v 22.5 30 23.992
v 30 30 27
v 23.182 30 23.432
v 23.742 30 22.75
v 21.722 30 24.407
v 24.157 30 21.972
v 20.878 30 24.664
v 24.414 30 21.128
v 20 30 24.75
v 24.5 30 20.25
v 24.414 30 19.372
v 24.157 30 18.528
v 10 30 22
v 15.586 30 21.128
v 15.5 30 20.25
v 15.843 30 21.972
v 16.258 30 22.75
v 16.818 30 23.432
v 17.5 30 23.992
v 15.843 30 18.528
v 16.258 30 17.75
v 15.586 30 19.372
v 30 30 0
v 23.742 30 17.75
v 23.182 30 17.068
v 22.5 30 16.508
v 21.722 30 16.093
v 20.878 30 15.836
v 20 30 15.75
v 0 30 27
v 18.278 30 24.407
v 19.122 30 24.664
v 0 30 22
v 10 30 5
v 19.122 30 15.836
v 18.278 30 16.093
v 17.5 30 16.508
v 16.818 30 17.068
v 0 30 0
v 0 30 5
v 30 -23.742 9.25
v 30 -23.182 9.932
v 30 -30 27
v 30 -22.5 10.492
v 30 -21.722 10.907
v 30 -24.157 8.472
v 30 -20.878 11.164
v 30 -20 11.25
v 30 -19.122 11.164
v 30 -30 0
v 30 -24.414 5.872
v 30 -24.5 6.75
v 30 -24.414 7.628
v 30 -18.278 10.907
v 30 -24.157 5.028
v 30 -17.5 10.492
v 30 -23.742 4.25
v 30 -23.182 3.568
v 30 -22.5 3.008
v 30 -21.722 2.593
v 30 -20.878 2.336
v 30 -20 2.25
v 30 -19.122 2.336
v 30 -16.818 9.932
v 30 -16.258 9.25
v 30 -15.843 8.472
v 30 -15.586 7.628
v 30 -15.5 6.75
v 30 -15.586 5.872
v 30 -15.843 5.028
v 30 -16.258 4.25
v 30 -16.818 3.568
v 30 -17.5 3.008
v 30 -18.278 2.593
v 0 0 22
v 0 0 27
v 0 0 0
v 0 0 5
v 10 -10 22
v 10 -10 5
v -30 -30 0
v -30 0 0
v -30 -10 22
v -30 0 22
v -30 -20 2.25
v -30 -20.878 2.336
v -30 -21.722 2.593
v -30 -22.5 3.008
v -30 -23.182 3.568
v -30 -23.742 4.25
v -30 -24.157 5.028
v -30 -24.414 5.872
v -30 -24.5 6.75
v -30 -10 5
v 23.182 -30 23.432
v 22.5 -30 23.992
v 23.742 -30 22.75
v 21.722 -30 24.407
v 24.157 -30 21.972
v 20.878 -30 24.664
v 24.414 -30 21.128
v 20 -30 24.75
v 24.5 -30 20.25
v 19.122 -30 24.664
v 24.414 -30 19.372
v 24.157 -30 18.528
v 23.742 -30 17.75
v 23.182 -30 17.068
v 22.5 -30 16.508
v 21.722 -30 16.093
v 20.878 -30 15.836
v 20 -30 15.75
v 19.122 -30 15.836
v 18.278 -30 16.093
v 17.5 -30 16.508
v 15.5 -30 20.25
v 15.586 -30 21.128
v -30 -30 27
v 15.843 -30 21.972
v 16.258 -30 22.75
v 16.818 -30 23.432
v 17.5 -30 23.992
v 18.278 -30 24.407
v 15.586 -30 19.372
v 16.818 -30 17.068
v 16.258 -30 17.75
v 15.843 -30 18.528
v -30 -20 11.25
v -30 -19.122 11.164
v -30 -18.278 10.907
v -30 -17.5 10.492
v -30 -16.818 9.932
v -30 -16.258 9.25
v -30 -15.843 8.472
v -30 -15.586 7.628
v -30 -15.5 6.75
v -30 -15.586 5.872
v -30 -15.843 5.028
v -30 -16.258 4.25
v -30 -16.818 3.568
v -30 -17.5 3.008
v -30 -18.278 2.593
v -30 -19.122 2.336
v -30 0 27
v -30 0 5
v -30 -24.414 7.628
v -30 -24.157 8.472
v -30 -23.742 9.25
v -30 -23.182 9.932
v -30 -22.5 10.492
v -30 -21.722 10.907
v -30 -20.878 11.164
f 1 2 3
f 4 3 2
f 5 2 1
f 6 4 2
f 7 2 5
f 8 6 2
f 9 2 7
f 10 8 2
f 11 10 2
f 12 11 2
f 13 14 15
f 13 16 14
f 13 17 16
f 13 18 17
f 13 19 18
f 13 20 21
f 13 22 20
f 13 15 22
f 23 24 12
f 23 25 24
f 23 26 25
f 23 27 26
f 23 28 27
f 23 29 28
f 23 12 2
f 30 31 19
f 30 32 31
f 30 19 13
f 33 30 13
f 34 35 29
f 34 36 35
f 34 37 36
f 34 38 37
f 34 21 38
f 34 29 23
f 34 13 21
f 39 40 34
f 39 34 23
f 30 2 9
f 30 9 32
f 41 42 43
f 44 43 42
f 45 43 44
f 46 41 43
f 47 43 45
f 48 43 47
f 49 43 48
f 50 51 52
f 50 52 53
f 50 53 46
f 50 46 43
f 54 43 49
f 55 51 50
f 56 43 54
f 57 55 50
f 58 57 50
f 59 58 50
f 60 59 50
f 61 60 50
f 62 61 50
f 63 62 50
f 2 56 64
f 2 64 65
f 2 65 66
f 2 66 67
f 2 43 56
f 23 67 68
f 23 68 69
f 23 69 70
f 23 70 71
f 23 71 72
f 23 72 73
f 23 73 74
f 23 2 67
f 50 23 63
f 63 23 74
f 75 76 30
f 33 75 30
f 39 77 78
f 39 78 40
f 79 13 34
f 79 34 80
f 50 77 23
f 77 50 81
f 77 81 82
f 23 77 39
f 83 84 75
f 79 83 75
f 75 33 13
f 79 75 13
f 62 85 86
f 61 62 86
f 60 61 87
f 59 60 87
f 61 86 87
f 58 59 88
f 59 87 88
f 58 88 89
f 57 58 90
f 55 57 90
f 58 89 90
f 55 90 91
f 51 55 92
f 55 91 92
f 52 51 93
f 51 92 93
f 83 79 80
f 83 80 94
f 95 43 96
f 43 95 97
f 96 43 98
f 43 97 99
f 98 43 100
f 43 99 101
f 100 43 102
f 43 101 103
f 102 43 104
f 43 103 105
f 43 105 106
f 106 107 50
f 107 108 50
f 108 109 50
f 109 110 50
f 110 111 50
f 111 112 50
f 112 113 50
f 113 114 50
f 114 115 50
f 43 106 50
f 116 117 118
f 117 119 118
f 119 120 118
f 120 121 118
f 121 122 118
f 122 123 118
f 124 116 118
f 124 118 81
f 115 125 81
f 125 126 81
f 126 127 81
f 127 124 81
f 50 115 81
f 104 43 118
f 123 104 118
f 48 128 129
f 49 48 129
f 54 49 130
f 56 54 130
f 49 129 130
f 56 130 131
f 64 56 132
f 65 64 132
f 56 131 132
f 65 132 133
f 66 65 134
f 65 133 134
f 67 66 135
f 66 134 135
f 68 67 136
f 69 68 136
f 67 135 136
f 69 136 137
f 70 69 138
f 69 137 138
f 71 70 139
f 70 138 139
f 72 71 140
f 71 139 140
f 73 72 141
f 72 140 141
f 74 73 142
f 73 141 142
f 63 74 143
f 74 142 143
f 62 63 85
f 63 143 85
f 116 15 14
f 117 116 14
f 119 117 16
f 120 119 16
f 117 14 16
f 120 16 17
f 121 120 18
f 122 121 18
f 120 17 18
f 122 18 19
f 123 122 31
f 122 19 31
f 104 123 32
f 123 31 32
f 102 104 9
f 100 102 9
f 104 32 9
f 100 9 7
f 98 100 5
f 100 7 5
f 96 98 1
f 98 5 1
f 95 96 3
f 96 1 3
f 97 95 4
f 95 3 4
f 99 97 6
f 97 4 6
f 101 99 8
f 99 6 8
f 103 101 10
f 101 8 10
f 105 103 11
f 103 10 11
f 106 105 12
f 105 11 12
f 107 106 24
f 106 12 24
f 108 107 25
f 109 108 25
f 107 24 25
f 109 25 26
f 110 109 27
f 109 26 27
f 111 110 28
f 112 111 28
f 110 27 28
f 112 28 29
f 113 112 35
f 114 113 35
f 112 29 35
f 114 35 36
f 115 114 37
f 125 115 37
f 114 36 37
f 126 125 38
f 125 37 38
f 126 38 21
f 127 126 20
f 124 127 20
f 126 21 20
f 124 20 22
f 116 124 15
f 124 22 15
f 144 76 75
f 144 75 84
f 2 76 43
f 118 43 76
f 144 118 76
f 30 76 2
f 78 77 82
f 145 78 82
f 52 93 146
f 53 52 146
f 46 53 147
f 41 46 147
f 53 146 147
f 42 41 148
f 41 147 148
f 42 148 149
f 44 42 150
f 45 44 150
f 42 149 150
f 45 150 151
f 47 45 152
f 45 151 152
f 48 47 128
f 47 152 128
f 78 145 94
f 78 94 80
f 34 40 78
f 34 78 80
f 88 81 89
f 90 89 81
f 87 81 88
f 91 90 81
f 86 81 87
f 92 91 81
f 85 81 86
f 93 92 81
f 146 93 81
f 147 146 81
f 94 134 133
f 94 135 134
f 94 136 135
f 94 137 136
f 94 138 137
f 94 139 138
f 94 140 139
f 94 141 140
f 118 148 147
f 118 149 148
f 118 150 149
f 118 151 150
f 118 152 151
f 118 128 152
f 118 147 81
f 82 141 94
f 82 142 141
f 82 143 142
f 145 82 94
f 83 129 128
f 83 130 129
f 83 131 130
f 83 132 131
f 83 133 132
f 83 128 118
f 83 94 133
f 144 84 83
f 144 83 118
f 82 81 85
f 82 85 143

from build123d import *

# Parameters (mm, degrees)
F0_W      = 25
F0_H      = 10
F0_W_2    = 10
F0_H_2    = 30
F1_DEPTH  = 27
F3_DEPTH  = 5
F5_DEPTH  = 13.5
F7_DEPTH  = 10
F8_DEPTH  = 10
F9_R      = 4.5
F10_DEPTH = 60
F12_DEPTH = 60.001


with BuildPart() as f1:
    # F0 (on Top) → F1 (new body)
    with BuildSketch(Plane.XY):
        Polygon((20, 0), (10, 0), (10, -10), (-5, -10), (-5, -20), (20, -20), align=None)
        with Locations((-17.5, -15)):
            Rectangle(F0_W, F0_H)
        with Locations((15, 15)):
            Rectangle(F0_W_2, F0_H_2)
    extrude(amount=F1_DEPTH)

    # F0 (on Top) → F3 (join)
    with BuildSketch(Plane.XY):
        with Locations((5, 15)):
            Rectangle(F0_W_2, F0_H_2)
        Polygon((10, 0), (0, 0), (-30, 0), (-30, -10), (-5, -10), (10, -10), align=None)
    extrude(amount=F3_DEPTH)

    # F5 (cut, through all): a face of the model
    f5_faces = [f1.faces().sort_by_distance(p)[0] for p in [
        (-10, -10.7071067812, 27),
    ]]
    extrude(f5_faces, amount=-F5_DEPTH, mode=Mode.SUBTRACT)

    # F6: F1 across plane


with BuildPart() as f1_1:
    add(f1.part)
    add(f1.part.mirror(Plane(origin=(0, 0, 13.5), x_dir=(1, 0, 0), z_dir=(0, 0, -1))))

    # F7 (add): a face of the model
    f7_faces = [f1_1.faces().sort_by_distance(p)[0] for p in [
        (-5, -20, 13.5),
    ]]
    extrude(f7_faces, amount=F7_DEPTH)

    # F8 (add): a face of the model
    f8_faces = [f1_1.faces().sort_by_distance(p)[0] for p in [
        (20, 0, 13.5),
    ]]
    extrude(f8_faces, amount=F8_DEPTH)

    # F9 (on face) → F10 (cut, through all)
    with BuildSketch(Plane(origin=(0, 30, 0), x_dir=(-1, 0, 0), z_dir=(0, 1, 0))):
        with Locations((-20, 20.25)):
            Circle(F9_R)
    extrude(amount=-F10_DEPTH, mode=Mode.SUBTRACT)

    # F11 (on face) → F12 (cut, through all)
    with BuildSketch(Plane(origin=(-30, 0, 0), x_dir=(0, -1, 0), z_dir=(-1, 0, 0))):
        with BuildLine():
            ThreePointArc((24.5, 6.75), (23.1819805153, 9.9319805153), (20, 11.25))
            Line((20, 11.25), (20, 2.25))
            ThreePointArc((20, 2.25), (23.1819805153, 3.5680194847), (24.5, 6.75))
        make_face()
        with BuildLine():
            Line((20, 2.25), (20, 11.25))
            ThreePointArc((20, 11.25), (15.5, 6.75), (20, 2.25))
        make_face()
    extrude(amount=-F12_DEPTH, mode=Mode.SUBTRACT)


solid = f1_1.part
